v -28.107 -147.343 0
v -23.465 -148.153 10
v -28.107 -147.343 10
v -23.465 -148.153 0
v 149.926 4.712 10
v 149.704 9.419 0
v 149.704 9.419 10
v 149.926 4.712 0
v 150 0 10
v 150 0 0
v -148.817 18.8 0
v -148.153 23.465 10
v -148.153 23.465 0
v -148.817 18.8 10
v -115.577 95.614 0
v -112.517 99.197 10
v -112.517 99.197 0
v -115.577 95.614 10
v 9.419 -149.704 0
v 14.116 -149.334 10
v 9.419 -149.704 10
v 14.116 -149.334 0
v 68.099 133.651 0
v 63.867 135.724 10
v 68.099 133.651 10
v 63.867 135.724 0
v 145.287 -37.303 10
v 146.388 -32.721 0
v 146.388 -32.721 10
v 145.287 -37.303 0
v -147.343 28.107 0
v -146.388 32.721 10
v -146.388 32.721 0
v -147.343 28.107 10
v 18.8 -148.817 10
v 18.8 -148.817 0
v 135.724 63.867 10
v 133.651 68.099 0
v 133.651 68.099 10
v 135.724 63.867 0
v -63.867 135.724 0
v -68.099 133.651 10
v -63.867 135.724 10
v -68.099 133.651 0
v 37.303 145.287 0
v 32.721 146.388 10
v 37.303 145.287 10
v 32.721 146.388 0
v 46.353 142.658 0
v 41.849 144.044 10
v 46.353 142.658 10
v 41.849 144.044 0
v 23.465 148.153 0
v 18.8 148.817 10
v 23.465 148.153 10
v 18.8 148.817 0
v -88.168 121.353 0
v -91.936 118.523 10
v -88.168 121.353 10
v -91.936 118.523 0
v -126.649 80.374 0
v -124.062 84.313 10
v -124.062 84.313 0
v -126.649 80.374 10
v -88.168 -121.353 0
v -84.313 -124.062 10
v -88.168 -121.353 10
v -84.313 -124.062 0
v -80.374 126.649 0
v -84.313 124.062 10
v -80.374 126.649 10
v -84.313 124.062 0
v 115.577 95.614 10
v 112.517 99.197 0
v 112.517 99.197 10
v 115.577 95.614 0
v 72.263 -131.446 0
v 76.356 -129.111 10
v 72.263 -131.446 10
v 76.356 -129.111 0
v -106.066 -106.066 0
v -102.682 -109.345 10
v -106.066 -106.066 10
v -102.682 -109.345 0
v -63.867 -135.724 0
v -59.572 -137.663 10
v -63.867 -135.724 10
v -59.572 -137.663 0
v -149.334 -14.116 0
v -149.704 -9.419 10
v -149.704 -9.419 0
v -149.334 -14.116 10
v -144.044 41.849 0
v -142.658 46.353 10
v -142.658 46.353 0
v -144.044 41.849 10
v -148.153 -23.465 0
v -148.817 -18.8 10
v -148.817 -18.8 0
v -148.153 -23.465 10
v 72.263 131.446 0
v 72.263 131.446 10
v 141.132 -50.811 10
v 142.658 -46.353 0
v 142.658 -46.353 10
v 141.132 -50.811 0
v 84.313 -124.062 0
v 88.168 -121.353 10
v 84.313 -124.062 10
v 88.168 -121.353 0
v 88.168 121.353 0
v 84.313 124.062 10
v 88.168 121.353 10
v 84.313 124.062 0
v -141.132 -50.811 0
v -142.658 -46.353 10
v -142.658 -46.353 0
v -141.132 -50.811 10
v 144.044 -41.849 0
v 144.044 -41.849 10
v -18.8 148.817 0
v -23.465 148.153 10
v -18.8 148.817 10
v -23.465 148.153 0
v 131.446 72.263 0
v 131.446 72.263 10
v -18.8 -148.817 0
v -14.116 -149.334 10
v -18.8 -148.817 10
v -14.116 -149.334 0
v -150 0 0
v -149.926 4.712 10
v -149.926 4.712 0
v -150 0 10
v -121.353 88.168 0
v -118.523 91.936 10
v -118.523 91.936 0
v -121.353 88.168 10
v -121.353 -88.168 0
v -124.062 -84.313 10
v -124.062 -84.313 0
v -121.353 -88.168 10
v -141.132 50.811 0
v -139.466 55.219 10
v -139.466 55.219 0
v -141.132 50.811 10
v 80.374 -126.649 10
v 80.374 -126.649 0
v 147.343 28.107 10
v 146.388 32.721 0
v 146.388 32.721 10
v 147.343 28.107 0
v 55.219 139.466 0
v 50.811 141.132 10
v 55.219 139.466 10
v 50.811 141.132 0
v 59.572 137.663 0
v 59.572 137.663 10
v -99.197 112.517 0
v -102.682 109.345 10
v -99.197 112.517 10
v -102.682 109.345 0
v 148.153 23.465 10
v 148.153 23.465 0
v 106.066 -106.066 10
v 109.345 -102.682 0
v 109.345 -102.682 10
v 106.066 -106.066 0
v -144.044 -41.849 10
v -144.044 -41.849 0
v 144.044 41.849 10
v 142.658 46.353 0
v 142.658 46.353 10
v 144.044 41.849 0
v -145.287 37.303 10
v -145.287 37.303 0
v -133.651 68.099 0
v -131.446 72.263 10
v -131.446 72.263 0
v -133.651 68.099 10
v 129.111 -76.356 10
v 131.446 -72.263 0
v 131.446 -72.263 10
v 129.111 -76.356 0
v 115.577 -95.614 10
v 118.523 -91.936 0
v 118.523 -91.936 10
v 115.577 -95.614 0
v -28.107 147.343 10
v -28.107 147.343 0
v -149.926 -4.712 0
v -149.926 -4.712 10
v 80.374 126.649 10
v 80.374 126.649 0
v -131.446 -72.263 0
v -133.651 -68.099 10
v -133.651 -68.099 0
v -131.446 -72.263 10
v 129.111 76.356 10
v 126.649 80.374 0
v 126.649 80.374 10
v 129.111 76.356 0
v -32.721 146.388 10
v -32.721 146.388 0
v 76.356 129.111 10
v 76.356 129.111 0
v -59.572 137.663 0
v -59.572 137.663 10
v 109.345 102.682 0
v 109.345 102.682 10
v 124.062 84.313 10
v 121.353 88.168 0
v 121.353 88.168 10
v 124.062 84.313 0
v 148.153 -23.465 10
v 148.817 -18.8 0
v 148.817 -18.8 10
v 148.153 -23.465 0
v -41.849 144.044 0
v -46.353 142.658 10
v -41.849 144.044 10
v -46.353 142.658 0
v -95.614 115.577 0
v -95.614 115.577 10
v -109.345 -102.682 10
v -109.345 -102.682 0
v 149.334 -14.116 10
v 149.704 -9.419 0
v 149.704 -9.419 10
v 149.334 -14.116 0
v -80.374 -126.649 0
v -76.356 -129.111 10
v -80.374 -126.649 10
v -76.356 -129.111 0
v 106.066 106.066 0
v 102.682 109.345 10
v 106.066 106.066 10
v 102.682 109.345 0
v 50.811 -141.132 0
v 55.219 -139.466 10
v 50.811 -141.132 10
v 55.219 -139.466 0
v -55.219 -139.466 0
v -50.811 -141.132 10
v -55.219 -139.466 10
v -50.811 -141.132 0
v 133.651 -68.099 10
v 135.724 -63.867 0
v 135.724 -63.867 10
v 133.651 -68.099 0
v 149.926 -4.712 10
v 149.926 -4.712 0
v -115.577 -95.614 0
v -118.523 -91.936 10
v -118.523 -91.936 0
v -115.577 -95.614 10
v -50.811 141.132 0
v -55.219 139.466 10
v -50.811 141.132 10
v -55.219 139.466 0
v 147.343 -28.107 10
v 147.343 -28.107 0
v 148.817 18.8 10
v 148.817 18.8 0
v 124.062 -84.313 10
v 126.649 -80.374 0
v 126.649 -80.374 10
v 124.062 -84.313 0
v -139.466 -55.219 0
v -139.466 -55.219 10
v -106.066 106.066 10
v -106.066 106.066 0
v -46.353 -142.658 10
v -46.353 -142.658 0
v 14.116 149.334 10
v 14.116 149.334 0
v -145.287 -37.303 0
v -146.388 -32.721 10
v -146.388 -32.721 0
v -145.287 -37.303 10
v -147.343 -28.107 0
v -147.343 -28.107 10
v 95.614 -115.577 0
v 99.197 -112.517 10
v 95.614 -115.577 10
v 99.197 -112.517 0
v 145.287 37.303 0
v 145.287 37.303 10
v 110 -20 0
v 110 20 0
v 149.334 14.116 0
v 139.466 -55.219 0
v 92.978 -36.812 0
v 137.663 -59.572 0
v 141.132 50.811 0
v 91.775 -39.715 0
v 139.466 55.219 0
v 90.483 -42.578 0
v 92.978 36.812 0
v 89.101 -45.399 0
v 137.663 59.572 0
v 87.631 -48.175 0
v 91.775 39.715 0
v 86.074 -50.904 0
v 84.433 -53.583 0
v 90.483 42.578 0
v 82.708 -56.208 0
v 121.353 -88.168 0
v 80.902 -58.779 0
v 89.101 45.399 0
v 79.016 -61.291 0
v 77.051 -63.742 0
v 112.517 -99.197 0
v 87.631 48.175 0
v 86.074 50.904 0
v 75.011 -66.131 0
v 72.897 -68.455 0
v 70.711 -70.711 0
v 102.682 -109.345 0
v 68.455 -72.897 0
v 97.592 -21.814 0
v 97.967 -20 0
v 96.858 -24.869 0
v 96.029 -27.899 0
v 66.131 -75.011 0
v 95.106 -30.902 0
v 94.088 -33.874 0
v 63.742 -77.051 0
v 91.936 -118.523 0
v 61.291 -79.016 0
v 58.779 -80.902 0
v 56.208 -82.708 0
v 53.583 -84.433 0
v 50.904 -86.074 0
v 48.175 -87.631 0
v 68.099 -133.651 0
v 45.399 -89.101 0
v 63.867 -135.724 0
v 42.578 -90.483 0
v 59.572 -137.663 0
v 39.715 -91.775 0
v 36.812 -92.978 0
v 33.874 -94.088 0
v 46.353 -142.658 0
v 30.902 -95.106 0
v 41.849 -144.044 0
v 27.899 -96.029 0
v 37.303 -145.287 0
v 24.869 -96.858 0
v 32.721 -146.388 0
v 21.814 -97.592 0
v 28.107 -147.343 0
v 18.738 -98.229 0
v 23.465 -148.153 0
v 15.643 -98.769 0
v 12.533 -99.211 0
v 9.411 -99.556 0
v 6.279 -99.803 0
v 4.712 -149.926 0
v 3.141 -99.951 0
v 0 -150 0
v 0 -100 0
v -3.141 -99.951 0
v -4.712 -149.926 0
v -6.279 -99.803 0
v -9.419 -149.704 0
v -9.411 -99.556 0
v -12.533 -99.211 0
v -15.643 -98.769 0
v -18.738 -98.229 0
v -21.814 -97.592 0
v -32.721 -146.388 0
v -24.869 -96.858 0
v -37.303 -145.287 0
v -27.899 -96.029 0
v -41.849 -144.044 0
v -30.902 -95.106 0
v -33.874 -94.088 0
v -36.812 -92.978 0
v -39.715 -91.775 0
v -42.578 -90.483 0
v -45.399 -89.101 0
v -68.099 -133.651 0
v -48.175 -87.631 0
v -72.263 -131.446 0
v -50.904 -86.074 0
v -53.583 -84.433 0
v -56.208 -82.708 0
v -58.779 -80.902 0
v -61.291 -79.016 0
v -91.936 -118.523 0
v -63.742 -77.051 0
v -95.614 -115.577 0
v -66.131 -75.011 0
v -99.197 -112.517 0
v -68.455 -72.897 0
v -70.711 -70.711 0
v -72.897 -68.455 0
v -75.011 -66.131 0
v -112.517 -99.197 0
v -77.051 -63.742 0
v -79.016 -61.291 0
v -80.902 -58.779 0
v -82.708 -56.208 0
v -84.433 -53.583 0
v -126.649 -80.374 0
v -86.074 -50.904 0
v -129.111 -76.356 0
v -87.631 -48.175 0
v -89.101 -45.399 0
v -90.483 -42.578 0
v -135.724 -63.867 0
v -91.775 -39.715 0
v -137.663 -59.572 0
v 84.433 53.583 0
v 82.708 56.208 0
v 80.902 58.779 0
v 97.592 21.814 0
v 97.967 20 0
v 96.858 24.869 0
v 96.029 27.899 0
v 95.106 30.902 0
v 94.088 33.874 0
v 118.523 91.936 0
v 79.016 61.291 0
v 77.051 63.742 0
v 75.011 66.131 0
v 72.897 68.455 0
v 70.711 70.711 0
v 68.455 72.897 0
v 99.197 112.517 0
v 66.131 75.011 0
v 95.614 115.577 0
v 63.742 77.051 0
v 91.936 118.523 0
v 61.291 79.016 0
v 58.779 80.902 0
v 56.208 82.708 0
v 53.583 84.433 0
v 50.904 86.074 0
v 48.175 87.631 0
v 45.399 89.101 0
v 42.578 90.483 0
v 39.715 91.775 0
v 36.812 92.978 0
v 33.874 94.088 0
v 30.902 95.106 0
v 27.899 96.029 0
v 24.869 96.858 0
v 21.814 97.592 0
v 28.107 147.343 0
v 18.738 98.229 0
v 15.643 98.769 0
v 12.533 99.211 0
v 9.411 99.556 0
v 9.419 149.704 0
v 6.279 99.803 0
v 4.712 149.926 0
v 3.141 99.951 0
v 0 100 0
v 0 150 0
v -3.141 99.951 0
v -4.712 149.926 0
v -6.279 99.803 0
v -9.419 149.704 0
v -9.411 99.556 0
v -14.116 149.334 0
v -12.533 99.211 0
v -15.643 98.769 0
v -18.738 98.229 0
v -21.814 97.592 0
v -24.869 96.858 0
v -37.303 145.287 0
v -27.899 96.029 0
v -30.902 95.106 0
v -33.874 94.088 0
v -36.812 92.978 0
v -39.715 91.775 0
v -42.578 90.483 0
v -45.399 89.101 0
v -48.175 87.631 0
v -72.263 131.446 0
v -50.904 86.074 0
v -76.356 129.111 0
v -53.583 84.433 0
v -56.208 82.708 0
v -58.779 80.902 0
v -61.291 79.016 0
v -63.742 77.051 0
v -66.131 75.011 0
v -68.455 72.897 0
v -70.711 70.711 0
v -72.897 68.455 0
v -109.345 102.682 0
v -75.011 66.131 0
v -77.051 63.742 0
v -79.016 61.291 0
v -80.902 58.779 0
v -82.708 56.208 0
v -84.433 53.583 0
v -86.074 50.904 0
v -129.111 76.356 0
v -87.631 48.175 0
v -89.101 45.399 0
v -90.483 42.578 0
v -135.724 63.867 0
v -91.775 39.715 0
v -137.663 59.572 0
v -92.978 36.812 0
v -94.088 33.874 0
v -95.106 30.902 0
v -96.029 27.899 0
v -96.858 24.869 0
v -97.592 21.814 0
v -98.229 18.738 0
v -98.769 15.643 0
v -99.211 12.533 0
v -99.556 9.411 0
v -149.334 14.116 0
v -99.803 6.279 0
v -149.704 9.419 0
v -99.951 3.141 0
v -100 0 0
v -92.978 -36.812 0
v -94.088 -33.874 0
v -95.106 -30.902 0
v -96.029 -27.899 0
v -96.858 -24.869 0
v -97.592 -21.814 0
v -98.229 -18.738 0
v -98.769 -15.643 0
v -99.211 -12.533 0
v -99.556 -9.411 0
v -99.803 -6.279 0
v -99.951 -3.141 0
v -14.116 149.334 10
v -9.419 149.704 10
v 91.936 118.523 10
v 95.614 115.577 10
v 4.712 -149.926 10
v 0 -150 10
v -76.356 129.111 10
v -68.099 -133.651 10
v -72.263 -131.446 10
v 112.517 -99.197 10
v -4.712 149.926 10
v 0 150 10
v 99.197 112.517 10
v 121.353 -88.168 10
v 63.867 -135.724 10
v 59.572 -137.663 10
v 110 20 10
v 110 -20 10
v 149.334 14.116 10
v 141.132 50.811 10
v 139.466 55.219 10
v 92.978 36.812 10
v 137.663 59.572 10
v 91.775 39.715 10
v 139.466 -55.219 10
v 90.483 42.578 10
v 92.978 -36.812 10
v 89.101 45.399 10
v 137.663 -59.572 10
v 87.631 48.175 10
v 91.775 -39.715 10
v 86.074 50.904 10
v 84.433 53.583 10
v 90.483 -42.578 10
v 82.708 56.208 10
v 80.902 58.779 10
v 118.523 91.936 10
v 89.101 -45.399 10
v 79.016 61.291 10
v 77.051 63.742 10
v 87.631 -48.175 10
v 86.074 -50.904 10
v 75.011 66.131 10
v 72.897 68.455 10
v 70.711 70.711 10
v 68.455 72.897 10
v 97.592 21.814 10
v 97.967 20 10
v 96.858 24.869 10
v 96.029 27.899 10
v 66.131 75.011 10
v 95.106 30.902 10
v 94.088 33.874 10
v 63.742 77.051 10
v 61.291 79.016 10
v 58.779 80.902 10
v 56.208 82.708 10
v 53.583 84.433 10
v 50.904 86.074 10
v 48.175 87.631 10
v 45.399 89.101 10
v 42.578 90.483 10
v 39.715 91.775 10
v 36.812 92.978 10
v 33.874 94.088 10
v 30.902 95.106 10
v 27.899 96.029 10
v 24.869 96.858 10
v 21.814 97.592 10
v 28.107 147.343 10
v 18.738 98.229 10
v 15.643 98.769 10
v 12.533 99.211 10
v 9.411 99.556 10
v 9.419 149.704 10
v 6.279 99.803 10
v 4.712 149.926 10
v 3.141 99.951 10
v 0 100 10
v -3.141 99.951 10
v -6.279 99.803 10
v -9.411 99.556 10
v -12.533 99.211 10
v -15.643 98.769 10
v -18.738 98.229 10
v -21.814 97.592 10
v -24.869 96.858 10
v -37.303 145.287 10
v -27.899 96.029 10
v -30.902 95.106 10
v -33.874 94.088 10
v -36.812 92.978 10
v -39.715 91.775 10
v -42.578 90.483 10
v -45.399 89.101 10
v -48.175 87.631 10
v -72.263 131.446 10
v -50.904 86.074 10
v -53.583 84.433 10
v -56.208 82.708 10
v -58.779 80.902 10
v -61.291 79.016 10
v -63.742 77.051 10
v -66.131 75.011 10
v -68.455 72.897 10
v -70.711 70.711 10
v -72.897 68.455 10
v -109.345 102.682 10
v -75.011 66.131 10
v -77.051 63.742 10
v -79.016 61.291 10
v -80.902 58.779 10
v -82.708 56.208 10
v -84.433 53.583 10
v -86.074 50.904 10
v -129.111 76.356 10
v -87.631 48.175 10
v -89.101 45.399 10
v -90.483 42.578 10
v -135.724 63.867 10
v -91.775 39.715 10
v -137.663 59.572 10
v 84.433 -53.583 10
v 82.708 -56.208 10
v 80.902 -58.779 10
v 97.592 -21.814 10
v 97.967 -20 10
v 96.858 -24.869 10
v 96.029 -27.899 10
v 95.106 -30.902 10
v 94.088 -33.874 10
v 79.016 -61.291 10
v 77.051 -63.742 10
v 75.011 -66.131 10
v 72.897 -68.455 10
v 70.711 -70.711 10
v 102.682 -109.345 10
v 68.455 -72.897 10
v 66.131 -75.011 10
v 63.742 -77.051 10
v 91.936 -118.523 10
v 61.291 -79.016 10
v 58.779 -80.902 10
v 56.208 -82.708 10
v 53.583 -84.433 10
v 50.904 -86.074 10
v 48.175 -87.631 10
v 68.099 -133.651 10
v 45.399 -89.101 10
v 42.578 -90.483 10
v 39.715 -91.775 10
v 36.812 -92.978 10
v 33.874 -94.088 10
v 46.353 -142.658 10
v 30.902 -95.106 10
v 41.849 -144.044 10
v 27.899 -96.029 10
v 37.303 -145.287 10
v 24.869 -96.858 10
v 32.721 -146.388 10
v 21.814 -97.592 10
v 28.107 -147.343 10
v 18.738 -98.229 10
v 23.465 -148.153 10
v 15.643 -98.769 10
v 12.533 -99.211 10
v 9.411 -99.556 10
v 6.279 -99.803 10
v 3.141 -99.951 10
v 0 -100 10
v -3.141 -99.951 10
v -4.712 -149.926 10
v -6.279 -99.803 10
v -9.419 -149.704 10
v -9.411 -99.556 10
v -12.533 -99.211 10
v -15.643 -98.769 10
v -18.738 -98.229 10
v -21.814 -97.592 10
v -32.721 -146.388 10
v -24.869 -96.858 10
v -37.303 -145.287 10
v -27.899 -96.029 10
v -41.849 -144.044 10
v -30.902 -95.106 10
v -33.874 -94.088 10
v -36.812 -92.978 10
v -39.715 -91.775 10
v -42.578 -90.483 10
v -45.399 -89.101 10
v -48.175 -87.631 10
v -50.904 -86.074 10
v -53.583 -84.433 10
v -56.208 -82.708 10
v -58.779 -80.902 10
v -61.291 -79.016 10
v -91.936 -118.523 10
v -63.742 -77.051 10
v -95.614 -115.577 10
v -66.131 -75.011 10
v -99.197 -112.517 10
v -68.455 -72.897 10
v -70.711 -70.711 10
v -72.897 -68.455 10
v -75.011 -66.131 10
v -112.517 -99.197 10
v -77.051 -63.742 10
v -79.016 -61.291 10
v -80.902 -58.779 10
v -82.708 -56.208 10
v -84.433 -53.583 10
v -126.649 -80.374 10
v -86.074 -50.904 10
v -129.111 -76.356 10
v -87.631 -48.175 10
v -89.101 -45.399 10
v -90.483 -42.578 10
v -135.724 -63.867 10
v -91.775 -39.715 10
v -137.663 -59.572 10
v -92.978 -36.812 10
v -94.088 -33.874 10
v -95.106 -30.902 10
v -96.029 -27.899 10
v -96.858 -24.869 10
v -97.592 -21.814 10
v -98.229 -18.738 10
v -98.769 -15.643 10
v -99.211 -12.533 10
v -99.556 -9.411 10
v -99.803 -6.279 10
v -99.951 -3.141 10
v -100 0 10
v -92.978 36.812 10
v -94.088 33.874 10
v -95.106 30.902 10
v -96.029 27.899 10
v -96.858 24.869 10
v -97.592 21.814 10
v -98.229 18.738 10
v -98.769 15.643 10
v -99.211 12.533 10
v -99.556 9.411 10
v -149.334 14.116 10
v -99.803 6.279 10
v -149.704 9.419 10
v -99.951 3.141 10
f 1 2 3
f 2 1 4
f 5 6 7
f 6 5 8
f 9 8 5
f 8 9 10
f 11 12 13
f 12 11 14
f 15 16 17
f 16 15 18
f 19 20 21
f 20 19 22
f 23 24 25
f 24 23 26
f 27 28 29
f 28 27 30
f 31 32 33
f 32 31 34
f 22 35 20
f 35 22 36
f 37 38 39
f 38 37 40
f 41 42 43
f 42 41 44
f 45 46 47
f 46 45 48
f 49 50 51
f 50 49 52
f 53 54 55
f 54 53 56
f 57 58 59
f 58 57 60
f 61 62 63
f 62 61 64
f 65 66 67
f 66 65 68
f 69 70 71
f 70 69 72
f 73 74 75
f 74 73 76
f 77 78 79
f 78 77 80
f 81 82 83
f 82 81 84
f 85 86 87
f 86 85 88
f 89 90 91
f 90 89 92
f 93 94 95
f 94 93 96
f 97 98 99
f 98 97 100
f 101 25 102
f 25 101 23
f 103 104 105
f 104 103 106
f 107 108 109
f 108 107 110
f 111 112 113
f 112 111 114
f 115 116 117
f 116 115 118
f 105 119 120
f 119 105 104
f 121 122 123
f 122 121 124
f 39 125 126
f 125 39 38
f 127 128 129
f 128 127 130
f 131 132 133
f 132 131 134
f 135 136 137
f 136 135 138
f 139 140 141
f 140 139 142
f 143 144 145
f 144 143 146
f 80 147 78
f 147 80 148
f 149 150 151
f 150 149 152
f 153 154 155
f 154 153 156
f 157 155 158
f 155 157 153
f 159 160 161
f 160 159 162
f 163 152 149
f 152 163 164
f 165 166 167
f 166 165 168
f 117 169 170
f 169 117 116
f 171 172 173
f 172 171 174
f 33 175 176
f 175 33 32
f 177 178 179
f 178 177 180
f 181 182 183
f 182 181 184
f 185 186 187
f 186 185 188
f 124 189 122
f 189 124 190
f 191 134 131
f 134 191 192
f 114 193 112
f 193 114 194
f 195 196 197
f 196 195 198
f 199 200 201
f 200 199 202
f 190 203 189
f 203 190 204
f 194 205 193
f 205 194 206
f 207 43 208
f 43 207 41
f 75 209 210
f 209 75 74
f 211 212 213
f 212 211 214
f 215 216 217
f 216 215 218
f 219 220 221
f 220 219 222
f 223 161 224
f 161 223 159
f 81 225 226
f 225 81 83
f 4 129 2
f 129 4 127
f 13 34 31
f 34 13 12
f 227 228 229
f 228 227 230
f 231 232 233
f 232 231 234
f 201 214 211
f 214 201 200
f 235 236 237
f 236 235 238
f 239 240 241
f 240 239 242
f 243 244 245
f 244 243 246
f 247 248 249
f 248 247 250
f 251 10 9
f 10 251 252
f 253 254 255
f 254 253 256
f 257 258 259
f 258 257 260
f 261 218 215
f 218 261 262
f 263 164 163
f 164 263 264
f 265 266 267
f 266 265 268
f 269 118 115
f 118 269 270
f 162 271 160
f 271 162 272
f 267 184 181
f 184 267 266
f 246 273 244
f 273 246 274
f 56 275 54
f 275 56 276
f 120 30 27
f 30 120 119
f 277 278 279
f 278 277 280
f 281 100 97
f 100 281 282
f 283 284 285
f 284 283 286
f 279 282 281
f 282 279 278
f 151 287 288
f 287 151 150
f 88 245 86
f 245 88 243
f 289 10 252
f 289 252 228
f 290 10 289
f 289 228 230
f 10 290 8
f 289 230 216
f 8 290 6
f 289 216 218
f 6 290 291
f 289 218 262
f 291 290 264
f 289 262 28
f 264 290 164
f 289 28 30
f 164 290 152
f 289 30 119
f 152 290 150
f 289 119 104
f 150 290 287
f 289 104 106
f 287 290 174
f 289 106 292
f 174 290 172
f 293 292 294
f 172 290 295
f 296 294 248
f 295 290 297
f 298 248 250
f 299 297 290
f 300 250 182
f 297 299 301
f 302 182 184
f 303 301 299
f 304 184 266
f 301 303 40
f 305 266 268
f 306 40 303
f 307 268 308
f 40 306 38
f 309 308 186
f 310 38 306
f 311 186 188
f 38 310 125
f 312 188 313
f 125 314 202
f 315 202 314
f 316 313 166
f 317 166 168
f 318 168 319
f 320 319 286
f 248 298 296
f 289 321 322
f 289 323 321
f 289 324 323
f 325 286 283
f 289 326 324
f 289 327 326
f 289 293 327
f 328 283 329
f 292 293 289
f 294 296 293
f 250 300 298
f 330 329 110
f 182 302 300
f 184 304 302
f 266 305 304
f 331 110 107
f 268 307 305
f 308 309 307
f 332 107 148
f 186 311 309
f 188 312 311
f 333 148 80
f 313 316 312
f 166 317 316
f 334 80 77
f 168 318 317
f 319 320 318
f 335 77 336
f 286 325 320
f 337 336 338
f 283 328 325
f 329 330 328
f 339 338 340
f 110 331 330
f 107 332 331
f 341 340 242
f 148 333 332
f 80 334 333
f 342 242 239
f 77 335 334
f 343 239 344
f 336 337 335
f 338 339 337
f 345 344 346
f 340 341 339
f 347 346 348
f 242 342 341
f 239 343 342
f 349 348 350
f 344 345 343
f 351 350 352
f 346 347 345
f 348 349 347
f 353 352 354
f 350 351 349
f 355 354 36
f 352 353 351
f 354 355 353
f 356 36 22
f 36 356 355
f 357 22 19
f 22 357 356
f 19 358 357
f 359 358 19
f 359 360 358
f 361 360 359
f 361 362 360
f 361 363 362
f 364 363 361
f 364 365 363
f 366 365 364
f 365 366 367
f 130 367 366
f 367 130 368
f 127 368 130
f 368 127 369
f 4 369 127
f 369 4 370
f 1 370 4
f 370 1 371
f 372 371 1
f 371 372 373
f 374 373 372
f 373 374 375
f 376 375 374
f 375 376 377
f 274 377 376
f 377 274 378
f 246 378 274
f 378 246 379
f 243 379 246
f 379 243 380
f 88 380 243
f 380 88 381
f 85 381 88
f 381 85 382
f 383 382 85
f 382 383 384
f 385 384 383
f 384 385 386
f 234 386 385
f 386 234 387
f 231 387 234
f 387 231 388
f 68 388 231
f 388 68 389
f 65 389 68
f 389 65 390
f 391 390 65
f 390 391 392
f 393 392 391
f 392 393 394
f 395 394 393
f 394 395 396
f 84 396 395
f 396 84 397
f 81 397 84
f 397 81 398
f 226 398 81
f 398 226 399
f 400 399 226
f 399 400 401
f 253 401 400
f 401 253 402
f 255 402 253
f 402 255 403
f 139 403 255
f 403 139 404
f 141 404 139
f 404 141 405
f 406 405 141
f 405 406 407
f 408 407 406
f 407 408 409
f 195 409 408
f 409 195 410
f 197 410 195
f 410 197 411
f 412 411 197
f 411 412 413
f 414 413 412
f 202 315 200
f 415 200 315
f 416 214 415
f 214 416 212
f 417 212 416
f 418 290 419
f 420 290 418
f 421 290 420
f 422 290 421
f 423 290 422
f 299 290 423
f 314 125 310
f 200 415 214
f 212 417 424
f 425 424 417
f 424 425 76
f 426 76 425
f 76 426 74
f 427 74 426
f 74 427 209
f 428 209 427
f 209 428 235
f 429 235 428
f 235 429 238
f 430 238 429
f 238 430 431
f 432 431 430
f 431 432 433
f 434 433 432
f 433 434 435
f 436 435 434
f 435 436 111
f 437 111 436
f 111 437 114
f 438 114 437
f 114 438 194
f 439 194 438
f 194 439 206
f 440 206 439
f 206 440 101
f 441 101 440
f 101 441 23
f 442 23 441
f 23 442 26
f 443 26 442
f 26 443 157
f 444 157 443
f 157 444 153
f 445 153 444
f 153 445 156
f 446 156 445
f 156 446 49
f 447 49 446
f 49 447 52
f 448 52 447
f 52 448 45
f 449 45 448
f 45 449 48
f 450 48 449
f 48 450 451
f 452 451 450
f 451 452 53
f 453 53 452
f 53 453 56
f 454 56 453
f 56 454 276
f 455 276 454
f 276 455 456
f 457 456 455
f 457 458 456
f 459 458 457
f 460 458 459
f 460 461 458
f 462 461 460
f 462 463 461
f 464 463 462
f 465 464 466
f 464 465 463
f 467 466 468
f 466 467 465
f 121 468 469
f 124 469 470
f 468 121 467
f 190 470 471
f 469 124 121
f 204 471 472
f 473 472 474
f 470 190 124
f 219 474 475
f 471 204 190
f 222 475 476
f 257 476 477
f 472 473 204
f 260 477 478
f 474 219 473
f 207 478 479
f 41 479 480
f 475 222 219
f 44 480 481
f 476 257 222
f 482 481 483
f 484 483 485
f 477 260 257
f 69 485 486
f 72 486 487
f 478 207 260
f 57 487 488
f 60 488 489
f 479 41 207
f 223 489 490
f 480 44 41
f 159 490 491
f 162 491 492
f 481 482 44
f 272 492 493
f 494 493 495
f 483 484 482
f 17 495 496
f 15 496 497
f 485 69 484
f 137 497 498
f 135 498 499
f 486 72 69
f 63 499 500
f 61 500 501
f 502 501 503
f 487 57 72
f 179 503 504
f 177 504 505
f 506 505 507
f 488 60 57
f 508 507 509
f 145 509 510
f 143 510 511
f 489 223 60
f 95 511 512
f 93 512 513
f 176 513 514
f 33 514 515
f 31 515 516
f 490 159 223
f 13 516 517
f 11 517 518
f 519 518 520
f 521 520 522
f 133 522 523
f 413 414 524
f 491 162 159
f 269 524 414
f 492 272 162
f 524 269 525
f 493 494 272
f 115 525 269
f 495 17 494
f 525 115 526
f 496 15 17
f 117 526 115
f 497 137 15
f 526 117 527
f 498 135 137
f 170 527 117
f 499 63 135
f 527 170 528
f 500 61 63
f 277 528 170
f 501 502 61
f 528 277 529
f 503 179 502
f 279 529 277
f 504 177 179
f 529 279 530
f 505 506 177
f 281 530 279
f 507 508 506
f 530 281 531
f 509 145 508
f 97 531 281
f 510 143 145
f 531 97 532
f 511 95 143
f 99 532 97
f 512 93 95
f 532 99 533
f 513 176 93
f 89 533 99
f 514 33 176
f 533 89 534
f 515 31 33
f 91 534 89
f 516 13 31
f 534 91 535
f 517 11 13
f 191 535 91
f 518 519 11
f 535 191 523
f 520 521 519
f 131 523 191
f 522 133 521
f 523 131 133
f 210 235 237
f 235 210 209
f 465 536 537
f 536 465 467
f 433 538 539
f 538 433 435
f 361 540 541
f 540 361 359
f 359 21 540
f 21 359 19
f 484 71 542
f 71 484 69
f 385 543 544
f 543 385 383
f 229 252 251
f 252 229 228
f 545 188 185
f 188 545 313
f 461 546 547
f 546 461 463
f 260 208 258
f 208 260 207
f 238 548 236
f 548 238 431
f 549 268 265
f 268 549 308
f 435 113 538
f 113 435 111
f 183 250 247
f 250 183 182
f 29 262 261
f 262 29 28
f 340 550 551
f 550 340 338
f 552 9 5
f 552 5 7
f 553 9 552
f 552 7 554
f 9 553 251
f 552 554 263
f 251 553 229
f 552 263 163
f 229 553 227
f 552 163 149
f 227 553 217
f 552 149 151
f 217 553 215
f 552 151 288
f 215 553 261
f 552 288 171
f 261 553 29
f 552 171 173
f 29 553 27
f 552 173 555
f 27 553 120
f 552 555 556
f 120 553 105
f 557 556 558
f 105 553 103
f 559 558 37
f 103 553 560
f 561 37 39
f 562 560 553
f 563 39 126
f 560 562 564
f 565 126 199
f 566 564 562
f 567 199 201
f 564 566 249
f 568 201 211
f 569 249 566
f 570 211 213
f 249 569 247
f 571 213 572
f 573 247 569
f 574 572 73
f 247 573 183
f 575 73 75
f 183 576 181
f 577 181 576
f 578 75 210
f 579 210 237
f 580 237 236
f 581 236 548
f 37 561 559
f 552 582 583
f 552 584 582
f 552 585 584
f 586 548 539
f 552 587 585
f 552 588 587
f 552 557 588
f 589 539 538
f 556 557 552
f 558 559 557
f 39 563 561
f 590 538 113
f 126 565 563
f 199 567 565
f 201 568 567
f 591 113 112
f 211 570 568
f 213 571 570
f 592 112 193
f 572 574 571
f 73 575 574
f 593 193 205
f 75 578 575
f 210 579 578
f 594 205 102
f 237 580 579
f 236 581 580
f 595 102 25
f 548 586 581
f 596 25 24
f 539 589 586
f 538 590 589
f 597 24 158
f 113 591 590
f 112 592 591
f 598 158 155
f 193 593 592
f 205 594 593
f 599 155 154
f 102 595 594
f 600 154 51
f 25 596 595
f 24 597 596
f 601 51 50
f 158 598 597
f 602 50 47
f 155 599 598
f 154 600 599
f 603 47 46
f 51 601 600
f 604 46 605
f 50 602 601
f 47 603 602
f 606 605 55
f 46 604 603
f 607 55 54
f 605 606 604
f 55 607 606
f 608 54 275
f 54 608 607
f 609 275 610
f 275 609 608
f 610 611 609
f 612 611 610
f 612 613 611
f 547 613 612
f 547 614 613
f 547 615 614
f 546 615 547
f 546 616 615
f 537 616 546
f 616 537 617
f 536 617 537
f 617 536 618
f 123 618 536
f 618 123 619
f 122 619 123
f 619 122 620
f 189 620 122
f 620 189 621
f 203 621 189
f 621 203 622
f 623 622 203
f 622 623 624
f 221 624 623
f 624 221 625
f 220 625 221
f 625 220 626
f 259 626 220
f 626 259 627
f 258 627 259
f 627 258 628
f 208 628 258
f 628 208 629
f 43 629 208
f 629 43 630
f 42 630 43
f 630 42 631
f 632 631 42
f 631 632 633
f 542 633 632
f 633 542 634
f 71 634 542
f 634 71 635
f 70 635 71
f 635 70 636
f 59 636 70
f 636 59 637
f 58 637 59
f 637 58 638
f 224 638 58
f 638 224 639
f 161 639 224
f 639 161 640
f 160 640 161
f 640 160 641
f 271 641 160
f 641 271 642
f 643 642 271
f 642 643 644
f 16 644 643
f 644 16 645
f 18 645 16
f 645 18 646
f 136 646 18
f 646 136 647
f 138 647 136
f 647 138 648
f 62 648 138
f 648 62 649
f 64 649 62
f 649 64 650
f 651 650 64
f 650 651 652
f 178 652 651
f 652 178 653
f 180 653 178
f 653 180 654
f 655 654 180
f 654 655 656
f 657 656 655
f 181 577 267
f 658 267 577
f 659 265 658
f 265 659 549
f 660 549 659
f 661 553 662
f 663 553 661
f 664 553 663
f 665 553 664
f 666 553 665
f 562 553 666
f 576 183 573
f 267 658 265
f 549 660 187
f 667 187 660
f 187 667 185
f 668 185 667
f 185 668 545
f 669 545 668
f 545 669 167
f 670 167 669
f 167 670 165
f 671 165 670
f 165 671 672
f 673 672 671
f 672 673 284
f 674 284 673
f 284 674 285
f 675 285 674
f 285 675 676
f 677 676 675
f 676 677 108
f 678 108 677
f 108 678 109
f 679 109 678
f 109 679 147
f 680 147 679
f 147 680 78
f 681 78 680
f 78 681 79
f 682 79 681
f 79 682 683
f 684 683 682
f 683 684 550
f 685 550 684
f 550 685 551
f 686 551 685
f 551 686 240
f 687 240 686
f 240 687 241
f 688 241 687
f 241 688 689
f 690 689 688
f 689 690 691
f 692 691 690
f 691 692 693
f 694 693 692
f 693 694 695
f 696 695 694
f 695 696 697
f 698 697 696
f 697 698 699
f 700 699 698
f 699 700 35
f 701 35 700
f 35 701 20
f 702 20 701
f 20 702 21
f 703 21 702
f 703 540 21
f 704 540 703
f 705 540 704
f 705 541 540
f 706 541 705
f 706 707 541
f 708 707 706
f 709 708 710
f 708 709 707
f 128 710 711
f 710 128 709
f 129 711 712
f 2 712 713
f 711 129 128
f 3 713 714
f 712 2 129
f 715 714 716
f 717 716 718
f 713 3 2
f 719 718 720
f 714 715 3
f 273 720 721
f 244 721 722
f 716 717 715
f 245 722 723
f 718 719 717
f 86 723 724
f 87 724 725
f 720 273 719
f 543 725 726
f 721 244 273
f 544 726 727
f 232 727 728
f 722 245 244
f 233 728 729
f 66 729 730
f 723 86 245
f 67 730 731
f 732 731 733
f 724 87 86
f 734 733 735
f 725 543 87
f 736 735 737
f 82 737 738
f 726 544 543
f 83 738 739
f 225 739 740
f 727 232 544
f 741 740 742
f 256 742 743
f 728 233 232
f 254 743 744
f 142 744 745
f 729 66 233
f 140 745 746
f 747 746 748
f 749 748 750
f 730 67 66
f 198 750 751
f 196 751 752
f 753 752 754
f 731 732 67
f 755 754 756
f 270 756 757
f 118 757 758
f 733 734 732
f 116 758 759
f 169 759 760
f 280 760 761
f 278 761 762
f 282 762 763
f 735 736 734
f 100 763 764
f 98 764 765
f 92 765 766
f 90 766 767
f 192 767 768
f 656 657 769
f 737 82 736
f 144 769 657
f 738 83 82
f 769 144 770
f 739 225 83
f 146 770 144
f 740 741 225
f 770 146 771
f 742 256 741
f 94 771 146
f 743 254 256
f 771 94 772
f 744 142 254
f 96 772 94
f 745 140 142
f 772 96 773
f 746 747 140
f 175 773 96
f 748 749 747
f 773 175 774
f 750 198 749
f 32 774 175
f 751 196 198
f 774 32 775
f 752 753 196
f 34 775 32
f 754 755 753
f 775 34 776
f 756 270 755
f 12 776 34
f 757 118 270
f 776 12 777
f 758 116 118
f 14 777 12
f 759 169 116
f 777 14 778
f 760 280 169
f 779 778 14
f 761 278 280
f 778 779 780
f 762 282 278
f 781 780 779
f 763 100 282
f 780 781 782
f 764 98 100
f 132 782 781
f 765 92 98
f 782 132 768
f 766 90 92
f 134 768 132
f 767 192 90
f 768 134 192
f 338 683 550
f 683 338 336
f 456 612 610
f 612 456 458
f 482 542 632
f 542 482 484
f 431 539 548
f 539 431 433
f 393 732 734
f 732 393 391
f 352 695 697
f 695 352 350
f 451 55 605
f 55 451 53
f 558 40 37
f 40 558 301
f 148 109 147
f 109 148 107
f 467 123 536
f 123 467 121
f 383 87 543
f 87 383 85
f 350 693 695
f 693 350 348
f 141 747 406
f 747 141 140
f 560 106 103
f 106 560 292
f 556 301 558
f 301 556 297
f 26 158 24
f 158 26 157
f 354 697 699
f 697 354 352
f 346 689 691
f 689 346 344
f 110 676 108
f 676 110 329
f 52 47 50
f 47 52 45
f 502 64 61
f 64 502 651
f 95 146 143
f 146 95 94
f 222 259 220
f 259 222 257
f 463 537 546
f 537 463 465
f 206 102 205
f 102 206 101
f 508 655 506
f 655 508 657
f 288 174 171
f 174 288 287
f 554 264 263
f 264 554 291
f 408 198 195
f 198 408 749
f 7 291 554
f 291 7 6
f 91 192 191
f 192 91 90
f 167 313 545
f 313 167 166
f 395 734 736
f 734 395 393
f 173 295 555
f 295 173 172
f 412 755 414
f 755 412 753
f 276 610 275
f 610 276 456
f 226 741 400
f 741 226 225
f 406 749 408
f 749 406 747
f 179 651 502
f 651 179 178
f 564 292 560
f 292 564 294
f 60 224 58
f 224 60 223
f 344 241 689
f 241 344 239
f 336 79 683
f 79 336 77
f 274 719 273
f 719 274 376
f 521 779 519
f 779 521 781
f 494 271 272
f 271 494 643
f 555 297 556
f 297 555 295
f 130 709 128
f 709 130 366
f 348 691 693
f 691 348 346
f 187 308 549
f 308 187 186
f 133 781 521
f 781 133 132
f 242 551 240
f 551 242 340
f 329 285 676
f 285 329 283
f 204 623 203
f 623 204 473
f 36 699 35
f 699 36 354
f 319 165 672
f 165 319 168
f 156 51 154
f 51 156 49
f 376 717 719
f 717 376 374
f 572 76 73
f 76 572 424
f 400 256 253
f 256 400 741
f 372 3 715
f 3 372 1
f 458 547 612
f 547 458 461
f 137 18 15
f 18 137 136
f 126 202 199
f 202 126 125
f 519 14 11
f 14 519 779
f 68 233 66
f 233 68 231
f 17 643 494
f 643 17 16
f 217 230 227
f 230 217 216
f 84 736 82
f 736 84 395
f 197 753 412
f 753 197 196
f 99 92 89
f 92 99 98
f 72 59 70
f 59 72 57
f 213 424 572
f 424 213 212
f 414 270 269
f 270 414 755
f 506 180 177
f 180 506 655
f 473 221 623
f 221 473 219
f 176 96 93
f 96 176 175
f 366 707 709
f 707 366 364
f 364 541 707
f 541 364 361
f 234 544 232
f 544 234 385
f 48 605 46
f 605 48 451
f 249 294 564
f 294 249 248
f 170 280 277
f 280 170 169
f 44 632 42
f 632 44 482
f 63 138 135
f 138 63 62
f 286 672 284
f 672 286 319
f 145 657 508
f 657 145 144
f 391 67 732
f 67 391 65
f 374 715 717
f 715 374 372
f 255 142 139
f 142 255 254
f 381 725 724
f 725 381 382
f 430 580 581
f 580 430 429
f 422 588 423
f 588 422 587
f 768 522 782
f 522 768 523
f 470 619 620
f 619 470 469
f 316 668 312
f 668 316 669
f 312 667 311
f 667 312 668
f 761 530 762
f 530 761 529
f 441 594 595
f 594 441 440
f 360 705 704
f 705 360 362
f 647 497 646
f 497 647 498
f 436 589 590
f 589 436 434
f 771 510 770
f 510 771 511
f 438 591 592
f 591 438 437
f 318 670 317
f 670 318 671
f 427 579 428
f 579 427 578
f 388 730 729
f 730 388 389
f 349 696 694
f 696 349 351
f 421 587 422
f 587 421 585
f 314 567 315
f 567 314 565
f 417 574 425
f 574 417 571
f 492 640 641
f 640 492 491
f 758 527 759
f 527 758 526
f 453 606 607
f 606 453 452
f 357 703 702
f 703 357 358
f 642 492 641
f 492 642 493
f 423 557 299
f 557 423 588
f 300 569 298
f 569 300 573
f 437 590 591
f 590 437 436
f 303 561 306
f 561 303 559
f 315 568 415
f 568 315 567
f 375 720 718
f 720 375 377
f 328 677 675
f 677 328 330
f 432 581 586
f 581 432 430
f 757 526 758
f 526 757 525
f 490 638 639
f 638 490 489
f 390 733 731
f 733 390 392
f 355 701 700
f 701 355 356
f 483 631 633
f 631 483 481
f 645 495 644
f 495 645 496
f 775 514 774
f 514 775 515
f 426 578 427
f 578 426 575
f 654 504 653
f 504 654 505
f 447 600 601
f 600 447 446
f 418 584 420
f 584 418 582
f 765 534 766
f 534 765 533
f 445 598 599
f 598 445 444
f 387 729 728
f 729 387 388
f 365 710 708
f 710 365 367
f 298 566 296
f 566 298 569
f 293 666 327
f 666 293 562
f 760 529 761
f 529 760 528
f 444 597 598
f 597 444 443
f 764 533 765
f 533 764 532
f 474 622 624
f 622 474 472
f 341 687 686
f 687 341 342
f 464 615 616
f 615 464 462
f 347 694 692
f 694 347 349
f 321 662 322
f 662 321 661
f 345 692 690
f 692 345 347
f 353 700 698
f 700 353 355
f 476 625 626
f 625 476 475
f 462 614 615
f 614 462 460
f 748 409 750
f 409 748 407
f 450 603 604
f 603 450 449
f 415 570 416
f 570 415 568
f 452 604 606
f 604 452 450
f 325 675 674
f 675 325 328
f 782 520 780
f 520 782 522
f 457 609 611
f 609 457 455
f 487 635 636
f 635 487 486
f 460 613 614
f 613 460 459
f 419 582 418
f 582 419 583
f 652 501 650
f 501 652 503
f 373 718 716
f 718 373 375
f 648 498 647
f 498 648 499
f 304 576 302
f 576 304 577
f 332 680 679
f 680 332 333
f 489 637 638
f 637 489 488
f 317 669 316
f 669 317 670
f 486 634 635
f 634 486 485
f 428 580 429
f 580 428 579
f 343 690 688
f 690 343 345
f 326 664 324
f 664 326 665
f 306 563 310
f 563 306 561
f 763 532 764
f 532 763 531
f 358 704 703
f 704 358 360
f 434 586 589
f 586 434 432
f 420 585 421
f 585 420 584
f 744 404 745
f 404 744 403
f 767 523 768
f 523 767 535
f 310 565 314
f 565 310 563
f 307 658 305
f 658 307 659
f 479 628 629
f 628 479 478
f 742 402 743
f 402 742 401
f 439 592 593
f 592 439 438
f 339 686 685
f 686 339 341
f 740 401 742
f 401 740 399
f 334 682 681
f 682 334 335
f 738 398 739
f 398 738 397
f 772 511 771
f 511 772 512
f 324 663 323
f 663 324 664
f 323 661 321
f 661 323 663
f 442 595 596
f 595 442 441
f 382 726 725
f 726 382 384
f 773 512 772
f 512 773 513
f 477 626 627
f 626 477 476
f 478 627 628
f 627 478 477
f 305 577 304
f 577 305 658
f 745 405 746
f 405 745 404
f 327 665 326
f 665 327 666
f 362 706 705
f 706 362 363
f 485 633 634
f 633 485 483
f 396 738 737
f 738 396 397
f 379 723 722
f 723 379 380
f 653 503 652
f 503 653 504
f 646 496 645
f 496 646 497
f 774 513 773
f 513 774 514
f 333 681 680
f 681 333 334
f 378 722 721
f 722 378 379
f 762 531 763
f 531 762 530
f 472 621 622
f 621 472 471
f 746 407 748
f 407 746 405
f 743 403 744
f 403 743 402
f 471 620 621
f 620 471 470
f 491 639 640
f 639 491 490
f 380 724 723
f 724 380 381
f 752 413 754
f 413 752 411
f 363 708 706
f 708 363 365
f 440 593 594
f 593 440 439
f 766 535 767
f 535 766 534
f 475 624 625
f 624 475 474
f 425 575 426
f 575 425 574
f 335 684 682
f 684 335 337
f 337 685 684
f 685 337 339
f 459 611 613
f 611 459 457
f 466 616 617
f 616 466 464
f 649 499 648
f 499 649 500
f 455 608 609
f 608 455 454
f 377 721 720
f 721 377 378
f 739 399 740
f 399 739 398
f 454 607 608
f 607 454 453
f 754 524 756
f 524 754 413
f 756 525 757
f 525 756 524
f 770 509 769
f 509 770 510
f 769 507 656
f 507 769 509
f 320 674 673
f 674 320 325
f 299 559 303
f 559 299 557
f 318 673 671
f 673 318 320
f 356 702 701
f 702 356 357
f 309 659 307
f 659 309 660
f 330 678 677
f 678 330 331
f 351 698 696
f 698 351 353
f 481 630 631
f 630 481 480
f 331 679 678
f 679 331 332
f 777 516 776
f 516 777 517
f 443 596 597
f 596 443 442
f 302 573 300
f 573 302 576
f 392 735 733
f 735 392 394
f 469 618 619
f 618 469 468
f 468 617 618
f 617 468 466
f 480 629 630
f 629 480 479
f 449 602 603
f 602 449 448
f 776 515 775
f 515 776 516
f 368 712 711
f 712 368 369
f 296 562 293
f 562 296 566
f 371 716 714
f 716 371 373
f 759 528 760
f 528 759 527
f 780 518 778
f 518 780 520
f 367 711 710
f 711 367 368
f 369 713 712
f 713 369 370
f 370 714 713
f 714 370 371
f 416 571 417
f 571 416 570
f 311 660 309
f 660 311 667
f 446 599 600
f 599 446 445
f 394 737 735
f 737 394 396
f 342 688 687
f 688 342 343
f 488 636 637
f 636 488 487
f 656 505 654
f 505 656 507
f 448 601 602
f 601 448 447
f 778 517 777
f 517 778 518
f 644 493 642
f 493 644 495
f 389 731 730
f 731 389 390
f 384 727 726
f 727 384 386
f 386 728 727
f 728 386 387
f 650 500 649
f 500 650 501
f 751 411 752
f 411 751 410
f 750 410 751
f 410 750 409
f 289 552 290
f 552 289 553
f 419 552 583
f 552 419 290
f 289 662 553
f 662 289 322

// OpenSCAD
// Dimensions in mm
outer_diameter = 300;
inner_diameter = 200;
thickness      = 10;

// Rectangular cutout dimensions
cutout_depth  = 10;   // 1 cm into the ring
cutout_width  = 40;   // 4 cm along the inner edge

difference() {

    // Outer disc
    cylinder(
        d = outer_diameter,
        h = thickness,
        $fn = 200
    );

    // Central circular cutout
    translate([0, 0, -1])
        cylinder(
            d = inner_diameter,
            h = thickness + 2,
            $fn = 200
        );

    // Rectangular cutout from inner edge
    translate([
        inner_diameter / 2 - 10,
        -cutout_width / 2,
        -1
    ])
        cube([
            cutout_depth + 10,
            cutout_width,
            thickness + 2
        ]);
}
